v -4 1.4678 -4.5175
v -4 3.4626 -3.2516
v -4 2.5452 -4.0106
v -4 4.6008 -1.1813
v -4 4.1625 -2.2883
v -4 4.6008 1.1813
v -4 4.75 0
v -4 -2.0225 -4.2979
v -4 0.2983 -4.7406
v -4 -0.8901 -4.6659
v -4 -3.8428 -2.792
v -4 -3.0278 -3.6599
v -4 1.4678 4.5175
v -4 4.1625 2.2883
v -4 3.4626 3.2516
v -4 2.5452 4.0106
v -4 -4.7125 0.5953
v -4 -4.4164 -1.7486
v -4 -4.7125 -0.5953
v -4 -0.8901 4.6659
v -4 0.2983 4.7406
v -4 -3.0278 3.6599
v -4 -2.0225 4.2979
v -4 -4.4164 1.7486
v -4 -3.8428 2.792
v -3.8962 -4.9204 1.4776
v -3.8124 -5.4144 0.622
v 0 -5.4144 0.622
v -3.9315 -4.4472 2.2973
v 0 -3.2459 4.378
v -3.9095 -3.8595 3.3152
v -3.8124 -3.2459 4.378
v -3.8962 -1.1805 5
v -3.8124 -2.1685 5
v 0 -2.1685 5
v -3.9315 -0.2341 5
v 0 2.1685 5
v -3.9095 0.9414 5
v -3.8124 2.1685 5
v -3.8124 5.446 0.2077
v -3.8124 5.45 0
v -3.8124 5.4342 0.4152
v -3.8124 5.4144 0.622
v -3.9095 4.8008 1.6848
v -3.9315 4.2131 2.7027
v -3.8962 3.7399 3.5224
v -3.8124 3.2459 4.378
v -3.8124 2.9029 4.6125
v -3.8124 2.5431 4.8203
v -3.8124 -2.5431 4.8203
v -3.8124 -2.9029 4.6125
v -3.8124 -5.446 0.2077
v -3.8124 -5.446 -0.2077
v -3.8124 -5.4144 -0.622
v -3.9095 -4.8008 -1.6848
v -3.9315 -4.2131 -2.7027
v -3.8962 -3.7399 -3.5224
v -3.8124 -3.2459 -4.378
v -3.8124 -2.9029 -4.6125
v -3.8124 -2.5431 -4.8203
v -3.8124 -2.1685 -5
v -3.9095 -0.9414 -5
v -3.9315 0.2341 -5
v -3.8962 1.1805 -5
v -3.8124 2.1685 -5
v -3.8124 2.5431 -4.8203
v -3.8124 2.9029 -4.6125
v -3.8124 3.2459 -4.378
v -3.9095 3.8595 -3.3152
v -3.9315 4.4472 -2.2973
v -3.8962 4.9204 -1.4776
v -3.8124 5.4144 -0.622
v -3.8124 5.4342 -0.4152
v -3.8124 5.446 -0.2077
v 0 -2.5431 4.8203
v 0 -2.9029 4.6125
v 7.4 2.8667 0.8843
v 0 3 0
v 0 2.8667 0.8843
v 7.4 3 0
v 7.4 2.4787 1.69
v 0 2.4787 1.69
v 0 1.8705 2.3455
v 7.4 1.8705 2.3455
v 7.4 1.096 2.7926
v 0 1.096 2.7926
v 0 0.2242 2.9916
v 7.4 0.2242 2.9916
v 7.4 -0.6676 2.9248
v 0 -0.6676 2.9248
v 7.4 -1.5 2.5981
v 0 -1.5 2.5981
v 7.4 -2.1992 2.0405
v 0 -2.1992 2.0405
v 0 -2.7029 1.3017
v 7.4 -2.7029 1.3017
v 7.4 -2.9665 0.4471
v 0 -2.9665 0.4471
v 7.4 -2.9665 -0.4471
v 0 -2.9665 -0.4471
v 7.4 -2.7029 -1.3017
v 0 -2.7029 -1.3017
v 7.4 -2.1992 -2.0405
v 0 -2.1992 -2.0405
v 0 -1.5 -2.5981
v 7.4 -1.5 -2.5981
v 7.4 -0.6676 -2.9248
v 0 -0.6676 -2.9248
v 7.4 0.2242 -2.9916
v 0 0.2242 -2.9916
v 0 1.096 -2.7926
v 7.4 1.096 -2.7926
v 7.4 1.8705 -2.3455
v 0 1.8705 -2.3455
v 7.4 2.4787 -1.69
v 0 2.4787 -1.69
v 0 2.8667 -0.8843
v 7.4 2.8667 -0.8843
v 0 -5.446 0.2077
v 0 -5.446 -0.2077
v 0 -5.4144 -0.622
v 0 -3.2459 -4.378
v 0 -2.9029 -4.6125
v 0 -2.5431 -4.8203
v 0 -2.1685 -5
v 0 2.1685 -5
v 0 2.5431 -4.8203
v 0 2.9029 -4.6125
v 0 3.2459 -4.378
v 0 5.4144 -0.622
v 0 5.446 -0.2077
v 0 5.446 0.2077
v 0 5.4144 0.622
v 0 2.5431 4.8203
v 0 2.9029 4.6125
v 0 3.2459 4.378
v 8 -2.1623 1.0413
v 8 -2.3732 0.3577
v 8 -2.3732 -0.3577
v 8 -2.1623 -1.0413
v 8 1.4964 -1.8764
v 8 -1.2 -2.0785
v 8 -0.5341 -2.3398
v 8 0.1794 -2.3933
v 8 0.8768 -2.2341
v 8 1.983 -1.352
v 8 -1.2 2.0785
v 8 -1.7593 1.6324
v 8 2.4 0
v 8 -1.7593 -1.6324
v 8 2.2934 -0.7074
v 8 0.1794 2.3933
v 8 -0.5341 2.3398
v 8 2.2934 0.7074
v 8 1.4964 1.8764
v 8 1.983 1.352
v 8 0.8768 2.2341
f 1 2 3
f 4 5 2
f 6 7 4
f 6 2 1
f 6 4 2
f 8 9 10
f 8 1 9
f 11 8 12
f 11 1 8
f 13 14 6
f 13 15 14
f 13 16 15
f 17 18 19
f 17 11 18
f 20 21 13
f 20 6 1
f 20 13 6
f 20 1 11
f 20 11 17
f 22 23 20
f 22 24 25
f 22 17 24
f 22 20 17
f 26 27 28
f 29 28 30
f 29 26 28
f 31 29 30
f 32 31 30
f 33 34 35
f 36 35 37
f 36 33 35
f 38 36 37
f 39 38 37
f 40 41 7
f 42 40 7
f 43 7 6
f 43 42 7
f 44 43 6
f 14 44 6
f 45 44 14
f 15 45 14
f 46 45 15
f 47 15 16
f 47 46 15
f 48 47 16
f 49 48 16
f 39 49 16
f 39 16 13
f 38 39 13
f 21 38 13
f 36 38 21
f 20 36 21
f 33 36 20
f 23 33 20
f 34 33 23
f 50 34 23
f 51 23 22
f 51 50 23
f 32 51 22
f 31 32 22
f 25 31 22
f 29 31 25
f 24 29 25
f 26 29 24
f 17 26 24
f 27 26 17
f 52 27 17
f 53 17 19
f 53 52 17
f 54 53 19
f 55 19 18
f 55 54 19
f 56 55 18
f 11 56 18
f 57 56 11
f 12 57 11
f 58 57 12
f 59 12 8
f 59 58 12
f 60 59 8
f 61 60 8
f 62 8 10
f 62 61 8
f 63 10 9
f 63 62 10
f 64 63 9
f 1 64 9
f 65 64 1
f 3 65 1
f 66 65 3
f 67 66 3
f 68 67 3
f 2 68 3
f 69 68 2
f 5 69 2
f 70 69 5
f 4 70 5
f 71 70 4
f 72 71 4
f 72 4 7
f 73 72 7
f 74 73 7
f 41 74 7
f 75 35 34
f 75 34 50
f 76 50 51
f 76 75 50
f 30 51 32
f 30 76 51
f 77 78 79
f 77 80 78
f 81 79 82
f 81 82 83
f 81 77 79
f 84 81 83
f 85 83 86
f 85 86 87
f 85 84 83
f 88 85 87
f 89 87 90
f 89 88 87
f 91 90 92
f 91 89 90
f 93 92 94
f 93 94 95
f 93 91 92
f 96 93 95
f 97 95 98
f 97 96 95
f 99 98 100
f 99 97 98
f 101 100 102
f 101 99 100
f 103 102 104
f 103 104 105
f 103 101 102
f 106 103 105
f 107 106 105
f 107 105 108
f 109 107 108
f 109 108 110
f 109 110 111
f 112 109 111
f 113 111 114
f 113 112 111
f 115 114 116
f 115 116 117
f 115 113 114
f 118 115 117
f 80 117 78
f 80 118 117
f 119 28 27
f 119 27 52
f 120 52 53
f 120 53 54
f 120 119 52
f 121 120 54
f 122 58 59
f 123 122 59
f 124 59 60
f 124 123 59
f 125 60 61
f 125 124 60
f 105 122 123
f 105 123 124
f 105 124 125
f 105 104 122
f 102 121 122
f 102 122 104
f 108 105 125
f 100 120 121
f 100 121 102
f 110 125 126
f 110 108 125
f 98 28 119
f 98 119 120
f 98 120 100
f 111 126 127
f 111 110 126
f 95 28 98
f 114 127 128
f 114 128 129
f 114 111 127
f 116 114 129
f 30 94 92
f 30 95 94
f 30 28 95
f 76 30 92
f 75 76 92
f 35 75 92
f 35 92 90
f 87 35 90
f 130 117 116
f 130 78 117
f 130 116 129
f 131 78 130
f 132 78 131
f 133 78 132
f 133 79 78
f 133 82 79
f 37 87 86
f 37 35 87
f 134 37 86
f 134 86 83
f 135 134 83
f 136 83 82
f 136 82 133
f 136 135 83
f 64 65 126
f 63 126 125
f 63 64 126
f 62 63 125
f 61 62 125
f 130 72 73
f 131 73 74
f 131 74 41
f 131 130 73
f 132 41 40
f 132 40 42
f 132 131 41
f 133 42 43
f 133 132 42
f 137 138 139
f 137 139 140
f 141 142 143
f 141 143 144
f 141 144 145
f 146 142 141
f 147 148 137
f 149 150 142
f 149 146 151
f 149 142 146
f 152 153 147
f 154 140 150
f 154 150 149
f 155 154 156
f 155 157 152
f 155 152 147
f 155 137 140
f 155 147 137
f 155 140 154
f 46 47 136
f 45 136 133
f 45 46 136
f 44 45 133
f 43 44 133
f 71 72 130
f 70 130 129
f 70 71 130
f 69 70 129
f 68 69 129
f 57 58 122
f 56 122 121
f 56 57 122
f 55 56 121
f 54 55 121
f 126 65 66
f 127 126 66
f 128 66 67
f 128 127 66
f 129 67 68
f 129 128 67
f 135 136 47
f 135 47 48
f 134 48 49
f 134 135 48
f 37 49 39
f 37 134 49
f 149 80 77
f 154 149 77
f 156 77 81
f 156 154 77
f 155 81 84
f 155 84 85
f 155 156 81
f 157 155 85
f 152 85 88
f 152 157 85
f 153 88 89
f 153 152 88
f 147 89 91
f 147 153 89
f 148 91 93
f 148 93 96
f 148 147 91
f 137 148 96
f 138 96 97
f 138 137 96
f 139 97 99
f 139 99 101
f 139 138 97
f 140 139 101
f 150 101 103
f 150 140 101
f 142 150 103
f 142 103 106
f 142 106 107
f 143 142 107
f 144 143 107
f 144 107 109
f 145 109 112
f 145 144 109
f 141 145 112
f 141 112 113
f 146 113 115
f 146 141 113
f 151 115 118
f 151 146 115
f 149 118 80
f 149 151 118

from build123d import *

# Parameters (mm, degrees)
SKETCH_2_OUTSIDE_W  = 16.808
SKETCH_2_OUTSIDE_H  = 16.808
CUT_EXTRUDE_1_DEPTH = 12


with BuildPart() as part:
    # Эскиз1 → Повернуть1 (revolve)
    with BuildSketch(Plane.XY):
        Polygon((-4, 0), (-4, 4.75), (-3.812435565, 5.45), (0, 5.45), (0, 3), (7.4, 3), (8, 2.4), (8, 0), align=None)
    revolve(axis=Axis((-1000, 0, 0), (1, 0, 0)))

    # Эскиз2 outside → Вырез-Вытянуть1 (cut)
    with BuildSketch(Plane.ZY.offset(4)):
        Rectangle(SKETCH_2_OUTSIDE_W, SKETCH_2_OUTSIDE_H)
        Polygon((0, 5.773502692), (-5, 2.886751346), (-5, -2.886751346), (0, -5.773502692), (5, -2.886751346), (5, 2.886751346), align=None, mode=Mode.SUBTRACT)
    extrude(amount=-CUT_EXTRUDE_1_DEPTH, mode=Mode.SUBTRACT)


solid = part.part
